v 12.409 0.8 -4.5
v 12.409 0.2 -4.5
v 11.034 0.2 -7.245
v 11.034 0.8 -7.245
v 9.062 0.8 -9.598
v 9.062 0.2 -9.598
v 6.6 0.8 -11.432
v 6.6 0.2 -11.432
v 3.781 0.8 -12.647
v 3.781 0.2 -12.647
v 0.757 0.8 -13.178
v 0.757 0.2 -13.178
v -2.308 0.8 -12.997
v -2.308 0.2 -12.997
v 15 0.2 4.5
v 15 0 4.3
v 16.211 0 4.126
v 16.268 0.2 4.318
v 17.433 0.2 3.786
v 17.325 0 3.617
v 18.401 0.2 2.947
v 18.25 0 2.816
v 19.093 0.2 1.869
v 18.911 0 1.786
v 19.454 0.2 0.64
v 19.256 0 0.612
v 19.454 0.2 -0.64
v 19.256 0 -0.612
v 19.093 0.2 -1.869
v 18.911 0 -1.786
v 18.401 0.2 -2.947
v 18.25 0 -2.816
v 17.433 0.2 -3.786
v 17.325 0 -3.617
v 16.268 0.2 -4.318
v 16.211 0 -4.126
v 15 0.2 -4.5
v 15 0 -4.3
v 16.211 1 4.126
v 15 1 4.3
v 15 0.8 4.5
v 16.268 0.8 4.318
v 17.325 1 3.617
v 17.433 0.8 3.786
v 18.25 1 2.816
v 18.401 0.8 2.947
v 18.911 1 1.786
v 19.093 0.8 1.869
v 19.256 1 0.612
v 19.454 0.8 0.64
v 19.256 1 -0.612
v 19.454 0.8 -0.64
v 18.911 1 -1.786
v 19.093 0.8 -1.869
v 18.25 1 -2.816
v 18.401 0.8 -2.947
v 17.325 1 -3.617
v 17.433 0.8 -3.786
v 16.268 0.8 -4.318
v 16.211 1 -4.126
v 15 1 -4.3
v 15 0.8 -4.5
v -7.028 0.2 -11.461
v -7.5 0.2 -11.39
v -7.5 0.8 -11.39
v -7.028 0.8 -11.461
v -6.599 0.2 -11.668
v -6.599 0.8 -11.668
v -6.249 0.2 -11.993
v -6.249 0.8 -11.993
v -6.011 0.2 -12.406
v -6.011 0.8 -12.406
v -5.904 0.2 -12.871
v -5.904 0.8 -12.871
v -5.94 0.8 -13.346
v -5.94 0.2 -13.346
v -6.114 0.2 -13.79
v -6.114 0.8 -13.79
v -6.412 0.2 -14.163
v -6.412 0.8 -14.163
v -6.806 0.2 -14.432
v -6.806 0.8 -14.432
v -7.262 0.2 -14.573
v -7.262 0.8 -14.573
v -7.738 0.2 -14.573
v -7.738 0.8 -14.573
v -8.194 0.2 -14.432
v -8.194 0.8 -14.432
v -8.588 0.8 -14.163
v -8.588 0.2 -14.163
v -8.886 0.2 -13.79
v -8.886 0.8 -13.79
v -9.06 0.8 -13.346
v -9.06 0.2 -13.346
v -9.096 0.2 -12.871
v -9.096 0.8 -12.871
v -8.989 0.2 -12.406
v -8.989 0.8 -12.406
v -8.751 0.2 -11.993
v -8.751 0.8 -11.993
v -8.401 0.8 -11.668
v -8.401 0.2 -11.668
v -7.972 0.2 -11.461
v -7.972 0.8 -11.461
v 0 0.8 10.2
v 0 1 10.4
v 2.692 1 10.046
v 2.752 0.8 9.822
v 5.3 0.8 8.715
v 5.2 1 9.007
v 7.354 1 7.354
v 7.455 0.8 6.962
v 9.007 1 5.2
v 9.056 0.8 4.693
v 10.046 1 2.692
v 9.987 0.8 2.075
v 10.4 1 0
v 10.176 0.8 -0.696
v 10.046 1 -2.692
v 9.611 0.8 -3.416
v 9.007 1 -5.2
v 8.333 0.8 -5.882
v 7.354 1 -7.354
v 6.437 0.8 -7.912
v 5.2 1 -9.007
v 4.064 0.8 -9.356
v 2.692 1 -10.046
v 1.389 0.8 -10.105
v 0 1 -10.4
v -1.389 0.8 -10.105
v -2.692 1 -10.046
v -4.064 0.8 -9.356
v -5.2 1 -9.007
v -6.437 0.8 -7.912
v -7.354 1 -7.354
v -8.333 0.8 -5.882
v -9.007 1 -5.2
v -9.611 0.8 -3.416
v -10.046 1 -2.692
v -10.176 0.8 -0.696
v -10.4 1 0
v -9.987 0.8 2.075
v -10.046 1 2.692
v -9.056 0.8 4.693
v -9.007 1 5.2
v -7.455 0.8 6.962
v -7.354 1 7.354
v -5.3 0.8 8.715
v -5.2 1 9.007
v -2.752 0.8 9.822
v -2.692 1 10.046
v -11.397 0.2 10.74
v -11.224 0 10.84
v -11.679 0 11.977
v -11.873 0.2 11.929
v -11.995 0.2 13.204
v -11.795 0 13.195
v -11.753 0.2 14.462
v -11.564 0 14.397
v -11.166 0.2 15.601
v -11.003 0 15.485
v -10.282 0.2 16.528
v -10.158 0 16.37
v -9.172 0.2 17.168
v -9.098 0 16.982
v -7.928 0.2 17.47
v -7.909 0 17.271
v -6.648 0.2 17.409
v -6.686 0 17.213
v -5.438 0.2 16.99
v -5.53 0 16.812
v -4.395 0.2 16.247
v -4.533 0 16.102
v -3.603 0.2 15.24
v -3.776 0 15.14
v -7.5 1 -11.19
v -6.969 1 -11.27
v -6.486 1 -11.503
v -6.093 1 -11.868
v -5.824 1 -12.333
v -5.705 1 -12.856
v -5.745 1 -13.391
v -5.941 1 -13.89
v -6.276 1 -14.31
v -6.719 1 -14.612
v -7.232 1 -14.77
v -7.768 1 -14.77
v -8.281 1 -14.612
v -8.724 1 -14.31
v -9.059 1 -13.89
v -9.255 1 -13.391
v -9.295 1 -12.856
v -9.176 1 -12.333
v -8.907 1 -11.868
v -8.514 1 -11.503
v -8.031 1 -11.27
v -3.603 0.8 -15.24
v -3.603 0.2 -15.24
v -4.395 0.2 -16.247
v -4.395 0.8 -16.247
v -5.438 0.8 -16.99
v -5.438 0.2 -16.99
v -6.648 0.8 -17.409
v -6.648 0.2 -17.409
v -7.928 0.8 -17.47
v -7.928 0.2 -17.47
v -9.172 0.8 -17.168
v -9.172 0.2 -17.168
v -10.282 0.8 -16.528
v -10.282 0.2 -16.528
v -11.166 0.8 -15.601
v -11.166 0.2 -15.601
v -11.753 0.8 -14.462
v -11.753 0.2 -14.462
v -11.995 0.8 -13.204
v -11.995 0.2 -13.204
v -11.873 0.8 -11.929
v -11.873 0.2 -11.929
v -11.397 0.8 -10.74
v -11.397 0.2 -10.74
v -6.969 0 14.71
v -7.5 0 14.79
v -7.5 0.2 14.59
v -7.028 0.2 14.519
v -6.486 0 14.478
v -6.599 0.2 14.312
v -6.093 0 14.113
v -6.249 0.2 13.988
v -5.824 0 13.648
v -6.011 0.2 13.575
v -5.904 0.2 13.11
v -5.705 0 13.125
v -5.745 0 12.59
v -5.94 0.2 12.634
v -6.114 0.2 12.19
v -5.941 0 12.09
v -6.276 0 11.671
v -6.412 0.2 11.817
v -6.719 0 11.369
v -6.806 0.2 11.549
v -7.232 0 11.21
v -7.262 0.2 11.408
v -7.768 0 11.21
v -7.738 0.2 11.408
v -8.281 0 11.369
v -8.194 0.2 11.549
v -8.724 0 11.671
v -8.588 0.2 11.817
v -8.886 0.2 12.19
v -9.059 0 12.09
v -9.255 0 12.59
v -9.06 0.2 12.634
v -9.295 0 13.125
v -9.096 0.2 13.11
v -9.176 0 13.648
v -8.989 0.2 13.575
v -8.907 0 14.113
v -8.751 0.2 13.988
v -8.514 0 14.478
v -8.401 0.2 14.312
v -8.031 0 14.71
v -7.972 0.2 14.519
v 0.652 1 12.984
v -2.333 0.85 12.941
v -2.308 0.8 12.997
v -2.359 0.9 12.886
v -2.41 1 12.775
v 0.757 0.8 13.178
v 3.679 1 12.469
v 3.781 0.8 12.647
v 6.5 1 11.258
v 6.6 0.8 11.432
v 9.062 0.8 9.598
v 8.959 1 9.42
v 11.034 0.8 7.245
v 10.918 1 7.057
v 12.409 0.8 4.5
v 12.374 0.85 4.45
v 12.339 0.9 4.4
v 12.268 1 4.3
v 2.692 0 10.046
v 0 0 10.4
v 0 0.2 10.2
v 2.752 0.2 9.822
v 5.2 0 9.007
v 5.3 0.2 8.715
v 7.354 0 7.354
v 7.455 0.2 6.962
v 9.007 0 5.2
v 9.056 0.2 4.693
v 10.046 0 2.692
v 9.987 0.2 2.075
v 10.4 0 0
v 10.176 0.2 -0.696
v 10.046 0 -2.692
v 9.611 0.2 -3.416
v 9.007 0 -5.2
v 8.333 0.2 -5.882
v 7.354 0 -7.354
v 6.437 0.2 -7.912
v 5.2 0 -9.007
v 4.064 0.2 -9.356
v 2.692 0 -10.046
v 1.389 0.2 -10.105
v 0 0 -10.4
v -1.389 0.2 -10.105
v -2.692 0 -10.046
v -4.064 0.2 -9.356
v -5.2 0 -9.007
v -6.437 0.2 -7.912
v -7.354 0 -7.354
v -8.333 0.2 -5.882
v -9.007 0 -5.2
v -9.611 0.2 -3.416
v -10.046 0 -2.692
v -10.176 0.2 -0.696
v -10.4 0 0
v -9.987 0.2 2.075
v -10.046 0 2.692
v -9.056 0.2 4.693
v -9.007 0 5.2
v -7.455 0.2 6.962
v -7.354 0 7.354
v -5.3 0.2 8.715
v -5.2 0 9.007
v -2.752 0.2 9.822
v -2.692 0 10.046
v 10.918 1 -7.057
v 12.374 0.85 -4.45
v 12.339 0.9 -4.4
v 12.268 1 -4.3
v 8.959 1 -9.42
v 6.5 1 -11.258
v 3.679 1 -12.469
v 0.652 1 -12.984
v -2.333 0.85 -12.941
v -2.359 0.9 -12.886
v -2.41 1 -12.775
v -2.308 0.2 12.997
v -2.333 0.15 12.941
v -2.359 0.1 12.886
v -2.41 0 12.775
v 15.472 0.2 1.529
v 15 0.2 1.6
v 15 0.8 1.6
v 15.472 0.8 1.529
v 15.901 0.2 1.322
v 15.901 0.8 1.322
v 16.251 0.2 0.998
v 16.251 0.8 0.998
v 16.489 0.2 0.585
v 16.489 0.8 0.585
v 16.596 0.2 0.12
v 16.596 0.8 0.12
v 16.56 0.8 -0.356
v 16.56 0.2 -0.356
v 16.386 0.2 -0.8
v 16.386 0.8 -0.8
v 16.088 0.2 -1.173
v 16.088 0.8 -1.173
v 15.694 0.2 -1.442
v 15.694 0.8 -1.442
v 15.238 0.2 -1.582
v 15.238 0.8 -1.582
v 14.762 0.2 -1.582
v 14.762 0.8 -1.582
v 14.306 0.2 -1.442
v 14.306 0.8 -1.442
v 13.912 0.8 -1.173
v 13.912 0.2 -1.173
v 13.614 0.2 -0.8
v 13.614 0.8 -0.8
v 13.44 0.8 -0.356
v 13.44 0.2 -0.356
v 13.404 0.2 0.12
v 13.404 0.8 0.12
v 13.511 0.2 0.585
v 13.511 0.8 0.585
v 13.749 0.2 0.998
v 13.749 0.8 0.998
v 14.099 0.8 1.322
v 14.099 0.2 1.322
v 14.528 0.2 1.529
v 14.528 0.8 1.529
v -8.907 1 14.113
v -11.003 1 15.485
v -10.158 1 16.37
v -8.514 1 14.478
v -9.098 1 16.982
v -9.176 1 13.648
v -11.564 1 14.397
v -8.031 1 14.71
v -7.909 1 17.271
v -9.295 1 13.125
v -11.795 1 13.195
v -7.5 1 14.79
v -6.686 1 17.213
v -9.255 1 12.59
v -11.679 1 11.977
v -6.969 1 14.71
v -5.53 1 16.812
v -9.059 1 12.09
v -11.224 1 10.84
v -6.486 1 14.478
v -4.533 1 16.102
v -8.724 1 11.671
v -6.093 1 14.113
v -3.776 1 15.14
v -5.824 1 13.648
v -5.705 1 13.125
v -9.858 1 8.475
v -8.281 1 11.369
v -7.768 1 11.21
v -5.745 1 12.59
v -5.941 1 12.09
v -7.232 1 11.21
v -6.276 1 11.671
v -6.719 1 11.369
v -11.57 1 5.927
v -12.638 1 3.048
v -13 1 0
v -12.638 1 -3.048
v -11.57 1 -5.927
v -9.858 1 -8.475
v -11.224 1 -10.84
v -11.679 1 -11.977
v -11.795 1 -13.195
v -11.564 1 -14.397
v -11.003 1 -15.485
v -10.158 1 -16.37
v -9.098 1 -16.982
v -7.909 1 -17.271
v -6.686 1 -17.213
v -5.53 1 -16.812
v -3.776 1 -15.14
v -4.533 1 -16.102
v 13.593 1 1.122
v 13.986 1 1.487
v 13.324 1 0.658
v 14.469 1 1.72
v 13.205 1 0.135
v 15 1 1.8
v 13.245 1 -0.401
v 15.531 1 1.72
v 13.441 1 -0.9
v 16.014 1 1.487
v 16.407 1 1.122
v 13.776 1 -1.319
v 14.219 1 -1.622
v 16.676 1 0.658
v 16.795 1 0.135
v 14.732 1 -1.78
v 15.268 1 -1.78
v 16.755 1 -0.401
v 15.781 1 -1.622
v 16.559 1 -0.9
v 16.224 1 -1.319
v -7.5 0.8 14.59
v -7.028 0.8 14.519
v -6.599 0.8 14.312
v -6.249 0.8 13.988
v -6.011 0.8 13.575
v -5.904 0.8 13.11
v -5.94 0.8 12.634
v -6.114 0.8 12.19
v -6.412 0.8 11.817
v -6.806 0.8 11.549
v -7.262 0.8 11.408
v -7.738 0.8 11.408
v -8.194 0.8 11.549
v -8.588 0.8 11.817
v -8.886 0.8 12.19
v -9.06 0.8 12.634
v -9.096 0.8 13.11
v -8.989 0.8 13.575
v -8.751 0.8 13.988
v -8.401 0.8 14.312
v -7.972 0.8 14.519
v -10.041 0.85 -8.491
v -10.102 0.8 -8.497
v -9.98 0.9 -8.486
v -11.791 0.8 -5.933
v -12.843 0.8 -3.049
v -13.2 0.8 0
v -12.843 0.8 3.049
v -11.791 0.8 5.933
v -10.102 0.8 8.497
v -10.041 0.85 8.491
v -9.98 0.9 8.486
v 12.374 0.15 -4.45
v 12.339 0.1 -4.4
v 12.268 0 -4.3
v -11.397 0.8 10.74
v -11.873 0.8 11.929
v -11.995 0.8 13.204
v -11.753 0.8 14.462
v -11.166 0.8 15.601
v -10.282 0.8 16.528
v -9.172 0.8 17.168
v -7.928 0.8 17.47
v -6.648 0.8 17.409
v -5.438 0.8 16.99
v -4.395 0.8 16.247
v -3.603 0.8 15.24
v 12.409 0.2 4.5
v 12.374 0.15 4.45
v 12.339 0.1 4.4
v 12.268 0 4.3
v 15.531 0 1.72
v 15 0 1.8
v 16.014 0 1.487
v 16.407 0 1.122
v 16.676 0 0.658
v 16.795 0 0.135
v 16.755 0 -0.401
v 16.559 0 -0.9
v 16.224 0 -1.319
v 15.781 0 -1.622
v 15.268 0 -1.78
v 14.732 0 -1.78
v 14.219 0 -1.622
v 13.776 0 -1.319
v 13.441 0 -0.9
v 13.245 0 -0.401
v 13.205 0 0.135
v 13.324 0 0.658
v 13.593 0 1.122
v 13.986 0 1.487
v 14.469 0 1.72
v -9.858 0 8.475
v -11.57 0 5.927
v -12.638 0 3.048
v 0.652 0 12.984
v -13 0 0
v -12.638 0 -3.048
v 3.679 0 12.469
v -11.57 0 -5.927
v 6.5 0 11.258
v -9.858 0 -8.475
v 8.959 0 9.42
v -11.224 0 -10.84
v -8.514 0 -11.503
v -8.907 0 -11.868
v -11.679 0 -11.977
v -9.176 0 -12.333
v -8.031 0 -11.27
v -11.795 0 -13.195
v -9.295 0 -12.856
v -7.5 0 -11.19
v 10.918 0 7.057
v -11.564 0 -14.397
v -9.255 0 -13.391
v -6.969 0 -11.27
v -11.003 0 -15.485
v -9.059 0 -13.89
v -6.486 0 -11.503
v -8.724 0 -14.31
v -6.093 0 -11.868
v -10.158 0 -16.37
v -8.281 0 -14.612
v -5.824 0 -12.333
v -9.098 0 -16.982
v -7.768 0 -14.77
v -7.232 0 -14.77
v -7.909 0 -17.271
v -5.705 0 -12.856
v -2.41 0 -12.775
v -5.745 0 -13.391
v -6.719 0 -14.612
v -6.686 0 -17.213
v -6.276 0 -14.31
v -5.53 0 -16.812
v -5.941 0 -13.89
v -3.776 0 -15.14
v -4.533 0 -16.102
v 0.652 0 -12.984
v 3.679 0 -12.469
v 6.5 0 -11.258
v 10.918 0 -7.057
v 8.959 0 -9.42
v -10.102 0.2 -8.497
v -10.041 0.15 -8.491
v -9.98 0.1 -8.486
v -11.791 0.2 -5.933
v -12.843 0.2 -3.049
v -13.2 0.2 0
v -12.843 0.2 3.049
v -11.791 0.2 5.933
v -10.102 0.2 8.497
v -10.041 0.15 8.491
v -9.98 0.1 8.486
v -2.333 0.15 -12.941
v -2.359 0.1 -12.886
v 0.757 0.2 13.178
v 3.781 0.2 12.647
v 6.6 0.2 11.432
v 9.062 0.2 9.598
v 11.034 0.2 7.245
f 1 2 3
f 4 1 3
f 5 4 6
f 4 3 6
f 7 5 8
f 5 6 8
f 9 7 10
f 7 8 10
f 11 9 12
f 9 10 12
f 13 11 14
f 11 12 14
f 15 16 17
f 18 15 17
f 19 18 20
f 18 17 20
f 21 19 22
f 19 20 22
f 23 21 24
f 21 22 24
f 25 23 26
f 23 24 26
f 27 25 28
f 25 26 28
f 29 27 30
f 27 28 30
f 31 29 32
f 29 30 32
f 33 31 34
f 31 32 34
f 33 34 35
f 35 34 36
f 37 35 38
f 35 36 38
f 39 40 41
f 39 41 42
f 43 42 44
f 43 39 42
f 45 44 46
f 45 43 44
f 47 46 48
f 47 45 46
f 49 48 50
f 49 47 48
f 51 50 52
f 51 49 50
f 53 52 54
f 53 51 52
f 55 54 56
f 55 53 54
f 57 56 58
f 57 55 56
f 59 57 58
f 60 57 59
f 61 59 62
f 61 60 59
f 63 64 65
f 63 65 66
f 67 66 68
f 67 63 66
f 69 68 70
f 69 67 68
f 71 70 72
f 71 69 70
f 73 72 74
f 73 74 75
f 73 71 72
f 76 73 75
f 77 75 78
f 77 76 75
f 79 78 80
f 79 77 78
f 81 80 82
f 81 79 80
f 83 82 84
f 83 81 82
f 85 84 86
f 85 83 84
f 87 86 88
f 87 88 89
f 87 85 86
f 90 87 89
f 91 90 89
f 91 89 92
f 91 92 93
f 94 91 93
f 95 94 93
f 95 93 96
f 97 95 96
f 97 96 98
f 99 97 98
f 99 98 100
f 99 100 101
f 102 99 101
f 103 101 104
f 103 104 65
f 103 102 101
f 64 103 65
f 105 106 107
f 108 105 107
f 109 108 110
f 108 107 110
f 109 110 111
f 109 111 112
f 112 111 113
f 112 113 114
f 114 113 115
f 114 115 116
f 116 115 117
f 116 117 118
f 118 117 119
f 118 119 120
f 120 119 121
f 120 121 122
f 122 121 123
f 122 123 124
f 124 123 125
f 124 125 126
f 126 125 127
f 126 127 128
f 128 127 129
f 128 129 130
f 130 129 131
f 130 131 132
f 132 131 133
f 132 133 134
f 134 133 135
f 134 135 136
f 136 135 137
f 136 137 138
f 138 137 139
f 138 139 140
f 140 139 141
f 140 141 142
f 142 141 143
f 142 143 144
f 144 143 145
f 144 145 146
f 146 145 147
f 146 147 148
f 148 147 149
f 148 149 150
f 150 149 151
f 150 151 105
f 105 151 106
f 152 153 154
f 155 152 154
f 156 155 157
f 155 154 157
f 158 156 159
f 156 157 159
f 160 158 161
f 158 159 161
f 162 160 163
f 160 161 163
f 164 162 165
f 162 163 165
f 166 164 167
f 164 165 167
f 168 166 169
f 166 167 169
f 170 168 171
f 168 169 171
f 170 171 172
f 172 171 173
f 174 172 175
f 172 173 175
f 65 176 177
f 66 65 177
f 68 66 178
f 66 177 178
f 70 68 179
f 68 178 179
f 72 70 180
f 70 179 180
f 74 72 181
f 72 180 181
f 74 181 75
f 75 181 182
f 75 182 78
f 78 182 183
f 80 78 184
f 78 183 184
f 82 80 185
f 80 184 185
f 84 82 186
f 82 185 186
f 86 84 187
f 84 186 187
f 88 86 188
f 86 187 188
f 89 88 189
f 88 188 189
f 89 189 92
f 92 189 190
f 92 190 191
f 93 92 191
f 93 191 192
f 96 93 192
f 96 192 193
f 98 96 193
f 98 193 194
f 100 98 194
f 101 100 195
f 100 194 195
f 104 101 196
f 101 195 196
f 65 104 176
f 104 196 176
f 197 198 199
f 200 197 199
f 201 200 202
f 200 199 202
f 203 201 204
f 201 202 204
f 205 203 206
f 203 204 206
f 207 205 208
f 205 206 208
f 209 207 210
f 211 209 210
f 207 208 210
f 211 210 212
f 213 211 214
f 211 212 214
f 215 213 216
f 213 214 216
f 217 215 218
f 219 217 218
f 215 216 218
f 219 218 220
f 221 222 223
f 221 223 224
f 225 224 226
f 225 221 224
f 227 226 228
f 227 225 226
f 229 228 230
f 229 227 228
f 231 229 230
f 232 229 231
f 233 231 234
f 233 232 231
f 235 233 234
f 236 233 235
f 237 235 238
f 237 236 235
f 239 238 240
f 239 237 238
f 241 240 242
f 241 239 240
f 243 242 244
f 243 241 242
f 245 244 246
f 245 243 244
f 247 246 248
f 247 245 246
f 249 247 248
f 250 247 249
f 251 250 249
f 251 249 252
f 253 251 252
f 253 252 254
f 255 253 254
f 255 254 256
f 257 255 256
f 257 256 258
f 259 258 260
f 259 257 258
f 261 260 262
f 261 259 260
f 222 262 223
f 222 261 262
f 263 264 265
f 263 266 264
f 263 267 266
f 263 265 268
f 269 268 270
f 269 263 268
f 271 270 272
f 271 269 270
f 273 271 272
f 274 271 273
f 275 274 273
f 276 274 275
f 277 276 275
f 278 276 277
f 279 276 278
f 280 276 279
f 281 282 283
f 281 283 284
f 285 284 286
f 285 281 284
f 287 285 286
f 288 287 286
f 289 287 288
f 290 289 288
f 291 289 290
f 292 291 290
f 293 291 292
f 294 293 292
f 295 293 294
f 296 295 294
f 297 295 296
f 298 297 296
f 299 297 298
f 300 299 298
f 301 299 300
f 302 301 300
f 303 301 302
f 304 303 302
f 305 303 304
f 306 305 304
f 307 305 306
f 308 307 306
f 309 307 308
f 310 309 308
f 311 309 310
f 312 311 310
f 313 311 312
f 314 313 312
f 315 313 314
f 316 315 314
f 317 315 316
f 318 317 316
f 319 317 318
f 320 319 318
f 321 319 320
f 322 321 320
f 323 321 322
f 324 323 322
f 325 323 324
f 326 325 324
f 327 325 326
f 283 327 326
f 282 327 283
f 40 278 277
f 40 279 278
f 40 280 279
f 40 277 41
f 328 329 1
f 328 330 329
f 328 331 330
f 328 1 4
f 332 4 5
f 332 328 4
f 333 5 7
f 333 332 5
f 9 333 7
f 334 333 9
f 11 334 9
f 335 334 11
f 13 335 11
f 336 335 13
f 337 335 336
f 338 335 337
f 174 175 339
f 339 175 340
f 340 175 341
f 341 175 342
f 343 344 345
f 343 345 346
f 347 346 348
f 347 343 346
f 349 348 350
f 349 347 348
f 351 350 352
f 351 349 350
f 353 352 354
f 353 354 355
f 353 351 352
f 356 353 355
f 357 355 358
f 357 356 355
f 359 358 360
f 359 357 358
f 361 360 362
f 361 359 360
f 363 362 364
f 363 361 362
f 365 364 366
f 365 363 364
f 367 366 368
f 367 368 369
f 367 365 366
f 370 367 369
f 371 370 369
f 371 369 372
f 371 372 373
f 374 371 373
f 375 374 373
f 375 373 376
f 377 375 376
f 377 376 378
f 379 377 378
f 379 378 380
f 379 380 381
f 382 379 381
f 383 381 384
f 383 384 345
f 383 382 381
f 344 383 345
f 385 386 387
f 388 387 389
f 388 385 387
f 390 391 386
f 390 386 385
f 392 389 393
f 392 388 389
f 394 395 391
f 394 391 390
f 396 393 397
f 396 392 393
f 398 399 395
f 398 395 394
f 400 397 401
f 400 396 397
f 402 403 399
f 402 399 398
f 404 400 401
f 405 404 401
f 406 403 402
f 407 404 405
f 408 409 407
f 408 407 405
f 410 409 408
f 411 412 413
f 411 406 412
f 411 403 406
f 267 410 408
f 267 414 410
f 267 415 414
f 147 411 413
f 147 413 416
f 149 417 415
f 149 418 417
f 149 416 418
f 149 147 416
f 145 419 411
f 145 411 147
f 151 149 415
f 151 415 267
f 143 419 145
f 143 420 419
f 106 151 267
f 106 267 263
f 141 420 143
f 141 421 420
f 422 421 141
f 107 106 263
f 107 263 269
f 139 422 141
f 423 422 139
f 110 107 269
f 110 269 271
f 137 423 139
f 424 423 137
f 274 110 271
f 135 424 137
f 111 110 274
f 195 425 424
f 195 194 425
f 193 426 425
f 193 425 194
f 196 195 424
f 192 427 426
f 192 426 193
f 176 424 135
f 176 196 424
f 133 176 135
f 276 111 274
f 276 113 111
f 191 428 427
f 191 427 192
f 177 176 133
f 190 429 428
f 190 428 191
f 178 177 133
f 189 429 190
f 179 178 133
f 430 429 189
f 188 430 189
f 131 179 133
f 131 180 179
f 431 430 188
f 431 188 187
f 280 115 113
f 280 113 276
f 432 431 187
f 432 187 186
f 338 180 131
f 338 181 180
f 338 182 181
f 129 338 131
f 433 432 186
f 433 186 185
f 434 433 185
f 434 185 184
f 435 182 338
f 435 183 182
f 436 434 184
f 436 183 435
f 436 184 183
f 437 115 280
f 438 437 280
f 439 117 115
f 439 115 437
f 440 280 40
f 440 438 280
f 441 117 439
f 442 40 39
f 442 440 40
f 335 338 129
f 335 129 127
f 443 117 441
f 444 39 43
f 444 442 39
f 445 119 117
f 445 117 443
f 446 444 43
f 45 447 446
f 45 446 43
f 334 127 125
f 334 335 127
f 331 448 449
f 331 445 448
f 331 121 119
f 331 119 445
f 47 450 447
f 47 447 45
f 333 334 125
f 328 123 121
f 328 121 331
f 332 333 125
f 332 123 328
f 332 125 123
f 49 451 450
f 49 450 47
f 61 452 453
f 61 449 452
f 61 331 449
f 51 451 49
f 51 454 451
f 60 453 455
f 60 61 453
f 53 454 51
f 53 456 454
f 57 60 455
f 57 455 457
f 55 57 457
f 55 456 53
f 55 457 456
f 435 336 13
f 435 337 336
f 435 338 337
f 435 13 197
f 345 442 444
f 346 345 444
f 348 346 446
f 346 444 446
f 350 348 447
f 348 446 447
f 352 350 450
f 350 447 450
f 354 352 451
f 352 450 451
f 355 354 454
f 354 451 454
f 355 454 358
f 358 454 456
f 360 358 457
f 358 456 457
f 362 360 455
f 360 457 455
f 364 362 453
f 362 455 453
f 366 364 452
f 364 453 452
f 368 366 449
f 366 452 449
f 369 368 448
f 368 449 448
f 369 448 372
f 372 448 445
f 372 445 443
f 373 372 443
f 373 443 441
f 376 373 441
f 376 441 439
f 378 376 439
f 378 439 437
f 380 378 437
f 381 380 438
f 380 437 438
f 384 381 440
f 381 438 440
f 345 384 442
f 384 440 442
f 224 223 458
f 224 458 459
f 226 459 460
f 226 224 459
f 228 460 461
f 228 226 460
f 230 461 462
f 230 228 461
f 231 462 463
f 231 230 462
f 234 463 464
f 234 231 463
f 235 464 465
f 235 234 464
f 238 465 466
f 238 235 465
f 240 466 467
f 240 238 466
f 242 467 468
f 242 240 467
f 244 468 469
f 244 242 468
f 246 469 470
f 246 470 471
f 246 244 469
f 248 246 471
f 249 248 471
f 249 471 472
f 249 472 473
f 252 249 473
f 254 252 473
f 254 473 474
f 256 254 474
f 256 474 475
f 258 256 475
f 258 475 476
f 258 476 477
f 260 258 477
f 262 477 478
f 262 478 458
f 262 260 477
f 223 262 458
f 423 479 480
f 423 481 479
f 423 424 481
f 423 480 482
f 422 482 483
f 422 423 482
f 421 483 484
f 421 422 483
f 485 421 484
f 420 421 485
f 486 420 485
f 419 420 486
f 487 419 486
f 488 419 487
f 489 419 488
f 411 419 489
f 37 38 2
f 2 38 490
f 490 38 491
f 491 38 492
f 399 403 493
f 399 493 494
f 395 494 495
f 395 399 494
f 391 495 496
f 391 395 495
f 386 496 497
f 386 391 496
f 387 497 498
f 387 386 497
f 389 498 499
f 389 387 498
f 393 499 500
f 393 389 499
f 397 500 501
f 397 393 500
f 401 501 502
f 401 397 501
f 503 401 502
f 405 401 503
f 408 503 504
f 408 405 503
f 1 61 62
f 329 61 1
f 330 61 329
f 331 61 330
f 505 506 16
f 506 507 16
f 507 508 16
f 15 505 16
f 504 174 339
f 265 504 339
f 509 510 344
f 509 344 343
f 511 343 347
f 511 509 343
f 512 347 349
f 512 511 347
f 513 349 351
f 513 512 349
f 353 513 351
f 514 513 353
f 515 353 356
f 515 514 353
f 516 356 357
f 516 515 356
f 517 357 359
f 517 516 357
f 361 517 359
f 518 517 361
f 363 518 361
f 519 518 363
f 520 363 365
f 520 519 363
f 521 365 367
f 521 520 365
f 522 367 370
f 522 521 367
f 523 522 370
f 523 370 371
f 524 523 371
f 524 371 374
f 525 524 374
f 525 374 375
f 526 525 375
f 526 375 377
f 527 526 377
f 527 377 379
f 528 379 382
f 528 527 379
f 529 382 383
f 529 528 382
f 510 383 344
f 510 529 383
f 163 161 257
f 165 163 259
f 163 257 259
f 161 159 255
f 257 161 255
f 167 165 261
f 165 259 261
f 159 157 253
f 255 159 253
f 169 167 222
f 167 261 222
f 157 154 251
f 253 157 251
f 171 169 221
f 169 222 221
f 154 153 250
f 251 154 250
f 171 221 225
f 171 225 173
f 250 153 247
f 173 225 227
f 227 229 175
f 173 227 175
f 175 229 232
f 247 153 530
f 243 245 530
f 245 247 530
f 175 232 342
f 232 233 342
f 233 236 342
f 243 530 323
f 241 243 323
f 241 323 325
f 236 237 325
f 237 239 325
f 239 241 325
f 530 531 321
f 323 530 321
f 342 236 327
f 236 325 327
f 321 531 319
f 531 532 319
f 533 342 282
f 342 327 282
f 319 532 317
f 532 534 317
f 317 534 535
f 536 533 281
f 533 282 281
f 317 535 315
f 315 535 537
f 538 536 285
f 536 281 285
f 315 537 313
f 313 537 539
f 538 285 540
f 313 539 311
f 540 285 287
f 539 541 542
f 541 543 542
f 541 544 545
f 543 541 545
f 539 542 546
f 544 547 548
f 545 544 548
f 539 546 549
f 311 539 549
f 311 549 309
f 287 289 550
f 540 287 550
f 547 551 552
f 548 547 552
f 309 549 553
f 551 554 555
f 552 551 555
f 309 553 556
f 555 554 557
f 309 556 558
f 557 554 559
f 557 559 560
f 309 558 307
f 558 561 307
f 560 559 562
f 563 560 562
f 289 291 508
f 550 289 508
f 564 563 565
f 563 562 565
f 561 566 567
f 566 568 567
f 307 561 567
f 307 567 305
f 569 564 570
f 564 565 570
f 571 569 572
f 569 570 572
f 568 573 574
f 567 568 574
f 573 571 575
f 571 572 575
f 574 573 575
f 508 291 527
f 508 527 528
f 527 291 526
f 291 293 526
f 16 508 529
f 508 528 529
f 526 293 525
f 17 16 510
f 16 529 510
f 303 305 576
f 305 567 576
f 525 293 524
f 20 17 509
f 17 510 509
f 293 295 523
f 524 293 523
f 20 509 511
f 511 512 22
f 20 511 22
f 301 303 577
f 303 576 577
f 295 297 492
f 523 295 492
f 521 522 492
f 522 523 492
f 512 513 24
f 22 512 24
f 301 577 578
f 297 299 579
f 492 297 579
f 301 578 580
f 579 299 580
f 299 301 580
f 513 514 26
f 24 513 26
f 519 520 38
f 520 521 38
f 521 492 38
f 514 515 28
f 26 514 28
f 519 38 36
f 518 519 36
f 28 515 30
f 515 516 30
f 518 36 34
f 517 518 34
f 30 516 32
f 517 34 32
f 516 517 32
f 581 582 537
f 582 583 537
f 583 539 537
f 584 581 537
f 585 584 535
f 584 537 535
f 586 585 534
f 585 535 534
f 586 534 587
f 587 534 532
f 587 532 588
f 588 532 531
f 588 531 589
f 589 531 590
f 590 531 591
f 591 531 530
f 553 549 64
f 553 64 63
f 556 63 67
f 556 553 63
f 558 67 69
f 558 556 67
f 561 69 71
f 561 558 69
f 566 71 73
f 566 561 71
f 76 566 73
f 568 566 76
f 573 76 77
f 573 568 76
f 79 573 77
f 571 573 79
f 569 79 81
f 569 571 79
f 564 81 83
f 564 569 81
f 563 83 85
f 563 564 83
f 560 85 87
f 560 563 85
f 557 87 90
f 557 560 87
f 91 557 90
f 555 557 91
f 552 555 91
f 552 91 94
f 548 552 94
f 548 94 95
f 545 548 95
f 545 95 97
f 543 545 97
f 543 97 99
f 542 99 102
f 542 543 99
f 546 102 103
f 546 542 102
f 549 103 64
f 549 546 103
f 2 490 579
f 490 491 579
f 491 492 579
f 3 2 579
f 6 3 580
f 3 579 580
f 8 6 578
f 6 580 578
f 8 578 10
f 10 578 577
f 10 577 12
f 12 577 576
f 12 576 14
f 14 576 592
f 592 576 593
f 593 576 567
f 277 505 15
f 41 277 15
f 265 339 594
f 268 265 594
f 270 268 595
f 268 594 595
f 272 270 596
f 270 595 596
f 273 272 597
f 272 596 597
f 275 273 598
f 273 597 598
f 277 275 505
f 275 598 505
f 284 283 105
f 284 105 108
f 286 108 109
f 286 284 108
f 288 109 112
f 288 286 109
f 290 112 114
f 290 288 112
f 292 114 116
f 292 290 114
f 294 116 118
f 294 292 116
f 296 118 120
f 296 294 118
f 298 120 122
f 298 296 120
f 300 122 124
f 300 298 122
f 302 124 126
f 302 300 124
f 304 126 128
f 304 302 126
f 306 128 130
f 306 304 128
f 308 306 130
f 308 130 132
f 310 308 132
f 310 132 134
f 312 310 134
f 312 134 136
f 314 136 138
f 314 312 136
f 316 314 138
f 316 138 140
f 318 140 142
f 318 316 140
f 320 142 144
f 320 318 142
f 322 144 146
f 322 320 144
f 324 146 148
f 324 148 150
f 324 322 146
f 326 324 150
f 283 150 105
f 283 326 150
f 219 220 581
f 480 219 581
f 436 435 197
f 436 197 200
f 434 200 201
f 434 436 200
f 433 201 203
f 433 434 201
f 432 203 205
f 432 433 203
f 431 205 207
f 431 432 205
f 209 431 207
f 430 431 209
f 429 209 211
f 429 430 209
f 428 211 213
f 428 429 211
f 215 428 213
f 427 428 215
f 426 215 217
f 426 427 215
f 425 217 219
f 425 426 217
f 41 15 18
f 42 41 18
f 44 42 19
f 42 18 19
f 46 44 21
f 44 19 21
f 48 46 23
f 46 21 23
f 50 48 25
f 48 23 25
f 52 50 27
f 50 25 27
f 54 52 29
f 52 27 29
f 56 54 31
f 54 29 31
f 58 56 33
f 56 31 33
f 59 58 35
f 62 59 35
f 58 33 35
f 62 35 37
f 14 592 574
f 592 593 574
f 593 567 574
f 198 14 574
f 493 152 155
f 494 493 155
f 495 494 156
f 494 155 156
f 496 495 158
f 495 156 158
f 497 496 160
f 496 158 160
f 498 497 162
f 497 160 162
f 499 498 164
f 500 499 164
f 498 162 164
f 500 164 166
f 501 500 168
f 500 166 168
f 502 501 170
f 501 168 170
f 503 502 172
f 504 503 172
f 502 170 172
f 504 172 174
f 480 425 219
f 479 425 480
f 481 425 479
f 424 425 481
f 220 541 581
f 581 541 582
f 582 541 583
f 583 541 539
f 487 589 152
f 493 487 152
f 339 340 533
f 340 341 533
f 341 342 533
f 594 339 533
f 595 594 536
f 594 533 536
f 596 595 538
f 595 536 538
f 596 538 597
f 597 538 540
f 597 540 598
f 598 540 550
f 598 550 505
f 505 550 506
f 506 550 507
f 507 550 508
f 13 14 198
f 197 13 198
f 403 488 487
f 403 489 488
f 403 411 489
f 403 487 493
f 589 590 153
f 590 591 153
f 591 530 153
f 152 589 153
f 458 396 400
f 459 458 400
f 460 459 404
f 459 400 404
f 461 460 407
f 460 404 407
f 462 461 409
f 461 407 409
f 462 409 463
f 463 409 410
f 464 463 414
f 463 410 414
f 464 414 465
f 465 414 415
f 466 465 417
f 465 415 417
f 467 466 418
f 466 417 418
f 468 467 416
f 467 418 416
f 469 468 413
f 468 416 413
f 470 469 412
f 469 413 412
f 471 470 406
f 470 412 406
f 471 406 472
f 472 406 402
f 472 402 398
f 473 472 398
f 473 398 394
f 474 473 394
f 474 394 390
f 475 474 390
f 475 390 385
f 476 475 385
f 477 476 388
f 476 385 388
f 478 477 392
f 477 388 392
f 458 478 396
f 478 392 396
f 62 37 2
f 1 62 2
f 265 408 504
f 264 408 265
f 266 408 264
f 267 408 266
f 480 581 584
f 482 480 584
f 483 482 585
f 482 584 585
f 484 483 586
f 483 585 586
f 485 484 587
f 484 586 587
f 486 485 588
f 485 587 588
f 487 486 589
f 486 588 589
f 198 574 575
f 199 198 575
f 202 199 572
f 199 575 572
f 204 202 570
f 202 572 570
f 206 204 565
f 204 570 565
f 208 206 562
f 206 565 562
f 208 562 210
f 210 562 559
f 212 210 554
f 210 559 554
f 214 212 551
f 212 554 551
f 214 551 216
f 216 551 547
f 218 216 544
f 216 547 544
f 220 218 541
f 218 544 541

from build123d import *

# Parameters (mm, degrees)
SKETCH_1_R      = 1.6
SKETCH_1_R_2    = 10.2
EXTRUDE_1_DEPTH = 1
CHAMFER_1_SIZE  = 0.2


with BuildPart() as part:
    # 草图1 → 凸台-拉伸1 (new body)
    with BuildSketch(Plane(origin=(0, 0, 0), x_dir=(1, 0, 0), z_dir=(0, 1, 0))):
        with BuildLine():
            ThreePointArc((-2.307521047, -12.996743693), (6.6, -11.43153533), (12.409270728, -4.5))
            Line((12.409270728, -4.5), (15, -4.5))
            ThreePointArc((15, -4.5), (19.5, 0), (15, 4.5))
            Line((15, 4.5), (12.409270728, 4.5))
            ThreePointArc((12.409270728, 4.5), (6.6, 11.43153533), (-2.307521047, 12.996743693))
            Line((-2.307521047, 12.996743693), (-3.602885683, 15.240381057))
            ThreePointArc((-3.602885683, 15.240381057), (-9.75, 16.887495374), (-11.397114317, 10.740381057))
            Line((-11.397114317, 10.740381057), (-10.101749681, 8.496743693))
            ThreePointArc((-10.101749681, 8.496743693), (-13.2, 0), (-10.101749681, -8.496743693))
            Line((-10.101749681, -8.496743693), (-11.397114317, -10.740381057))
            ThreePointArc((-11.397114317, -10.740381057), (-9.75, -16.887495374), (-3.602885683, -15.240381057))
            Line((-3.602885683, -15.240381057), (-2.307521047, -12.996743693))
        make_face()
        with Locations(Location((-7.5, -12.990381057, 0), (0, 0, 270))):
            Circle(SKETCH_1_R, mode=Mode.SUBTRACT)
        with Locations(Location((15, 0, 0), (0, 0, 270))):
            Circle(SKETCH_1_R, mode=Mode.SUBTRACT)
        with Locations(Location((0, 0, 0), (0, 0, 270))):
            Circle(SKETCH_1_R_2, mode=Mode.SUBTRACT)
        with Locations(Location((-7.5, 12.990381057, 0), (0, 0, 270))):
            Circle(SKETCH_1_R, mode=Mode.SUBTRACT)
    extrude(amount=EXTRUDE_1_DEPTH)

    # 倒角1
    chamfer_1_edges = [part.edges().sort_by_distance(p)[0] for p in [
        (19.5, 1, 0),
        (13.704635364, 1, -4.5),
        (15, 0, -1.6),
        (-7.5, 0, 11.390381057),
        (-7.5, 0, -14.590381057),
        (0, 0, -10.2),
        (6.6, 0, 11.43153533),
        (-2.955203365, 0, 14.118562375),
        (-9.75, 0, 16.887495374),
        (6.6, 1, -11.43153533),
        (-10.749431999, 0, 9.618562375),
        (-13.2, 0, 0),
        (-10.749431999, 0, -9.618562375),
        (-9.75, 0, -16.887495374),
        (-2.955203365, 0, -14.118562375),
        (6.6, 0, -11.43153533),
        (13.704635364, 0, -4.5),
        (19.5, 0, 0),
        (-2.955203365, 1, -14.118562375),
        (13.704635364, 0, 4.5),
        (-9.75, 1, -16.887495374),
        (-10.749431999, 1, -9.618562375),
        (-13.2, 1, 0),
        (-10.749431999, 1, 9.618562375),
        (-9.75, 1, 16.887495374),
        (-2.955203365, 1, 14.118562375),
        (6.6, 1, 11.43153533),
        (0, 1, -10.2),
        (-7.5, 1, -14.590381057),
        (-7.5, 1, 11.390381057),
        (15, 1, -1.6),
        (13.704635364, 1, 4.5),
    ]]
    chamfer(chamfer_1_edges, length=CHAMFER_1_SIZE)


solid = part.part
